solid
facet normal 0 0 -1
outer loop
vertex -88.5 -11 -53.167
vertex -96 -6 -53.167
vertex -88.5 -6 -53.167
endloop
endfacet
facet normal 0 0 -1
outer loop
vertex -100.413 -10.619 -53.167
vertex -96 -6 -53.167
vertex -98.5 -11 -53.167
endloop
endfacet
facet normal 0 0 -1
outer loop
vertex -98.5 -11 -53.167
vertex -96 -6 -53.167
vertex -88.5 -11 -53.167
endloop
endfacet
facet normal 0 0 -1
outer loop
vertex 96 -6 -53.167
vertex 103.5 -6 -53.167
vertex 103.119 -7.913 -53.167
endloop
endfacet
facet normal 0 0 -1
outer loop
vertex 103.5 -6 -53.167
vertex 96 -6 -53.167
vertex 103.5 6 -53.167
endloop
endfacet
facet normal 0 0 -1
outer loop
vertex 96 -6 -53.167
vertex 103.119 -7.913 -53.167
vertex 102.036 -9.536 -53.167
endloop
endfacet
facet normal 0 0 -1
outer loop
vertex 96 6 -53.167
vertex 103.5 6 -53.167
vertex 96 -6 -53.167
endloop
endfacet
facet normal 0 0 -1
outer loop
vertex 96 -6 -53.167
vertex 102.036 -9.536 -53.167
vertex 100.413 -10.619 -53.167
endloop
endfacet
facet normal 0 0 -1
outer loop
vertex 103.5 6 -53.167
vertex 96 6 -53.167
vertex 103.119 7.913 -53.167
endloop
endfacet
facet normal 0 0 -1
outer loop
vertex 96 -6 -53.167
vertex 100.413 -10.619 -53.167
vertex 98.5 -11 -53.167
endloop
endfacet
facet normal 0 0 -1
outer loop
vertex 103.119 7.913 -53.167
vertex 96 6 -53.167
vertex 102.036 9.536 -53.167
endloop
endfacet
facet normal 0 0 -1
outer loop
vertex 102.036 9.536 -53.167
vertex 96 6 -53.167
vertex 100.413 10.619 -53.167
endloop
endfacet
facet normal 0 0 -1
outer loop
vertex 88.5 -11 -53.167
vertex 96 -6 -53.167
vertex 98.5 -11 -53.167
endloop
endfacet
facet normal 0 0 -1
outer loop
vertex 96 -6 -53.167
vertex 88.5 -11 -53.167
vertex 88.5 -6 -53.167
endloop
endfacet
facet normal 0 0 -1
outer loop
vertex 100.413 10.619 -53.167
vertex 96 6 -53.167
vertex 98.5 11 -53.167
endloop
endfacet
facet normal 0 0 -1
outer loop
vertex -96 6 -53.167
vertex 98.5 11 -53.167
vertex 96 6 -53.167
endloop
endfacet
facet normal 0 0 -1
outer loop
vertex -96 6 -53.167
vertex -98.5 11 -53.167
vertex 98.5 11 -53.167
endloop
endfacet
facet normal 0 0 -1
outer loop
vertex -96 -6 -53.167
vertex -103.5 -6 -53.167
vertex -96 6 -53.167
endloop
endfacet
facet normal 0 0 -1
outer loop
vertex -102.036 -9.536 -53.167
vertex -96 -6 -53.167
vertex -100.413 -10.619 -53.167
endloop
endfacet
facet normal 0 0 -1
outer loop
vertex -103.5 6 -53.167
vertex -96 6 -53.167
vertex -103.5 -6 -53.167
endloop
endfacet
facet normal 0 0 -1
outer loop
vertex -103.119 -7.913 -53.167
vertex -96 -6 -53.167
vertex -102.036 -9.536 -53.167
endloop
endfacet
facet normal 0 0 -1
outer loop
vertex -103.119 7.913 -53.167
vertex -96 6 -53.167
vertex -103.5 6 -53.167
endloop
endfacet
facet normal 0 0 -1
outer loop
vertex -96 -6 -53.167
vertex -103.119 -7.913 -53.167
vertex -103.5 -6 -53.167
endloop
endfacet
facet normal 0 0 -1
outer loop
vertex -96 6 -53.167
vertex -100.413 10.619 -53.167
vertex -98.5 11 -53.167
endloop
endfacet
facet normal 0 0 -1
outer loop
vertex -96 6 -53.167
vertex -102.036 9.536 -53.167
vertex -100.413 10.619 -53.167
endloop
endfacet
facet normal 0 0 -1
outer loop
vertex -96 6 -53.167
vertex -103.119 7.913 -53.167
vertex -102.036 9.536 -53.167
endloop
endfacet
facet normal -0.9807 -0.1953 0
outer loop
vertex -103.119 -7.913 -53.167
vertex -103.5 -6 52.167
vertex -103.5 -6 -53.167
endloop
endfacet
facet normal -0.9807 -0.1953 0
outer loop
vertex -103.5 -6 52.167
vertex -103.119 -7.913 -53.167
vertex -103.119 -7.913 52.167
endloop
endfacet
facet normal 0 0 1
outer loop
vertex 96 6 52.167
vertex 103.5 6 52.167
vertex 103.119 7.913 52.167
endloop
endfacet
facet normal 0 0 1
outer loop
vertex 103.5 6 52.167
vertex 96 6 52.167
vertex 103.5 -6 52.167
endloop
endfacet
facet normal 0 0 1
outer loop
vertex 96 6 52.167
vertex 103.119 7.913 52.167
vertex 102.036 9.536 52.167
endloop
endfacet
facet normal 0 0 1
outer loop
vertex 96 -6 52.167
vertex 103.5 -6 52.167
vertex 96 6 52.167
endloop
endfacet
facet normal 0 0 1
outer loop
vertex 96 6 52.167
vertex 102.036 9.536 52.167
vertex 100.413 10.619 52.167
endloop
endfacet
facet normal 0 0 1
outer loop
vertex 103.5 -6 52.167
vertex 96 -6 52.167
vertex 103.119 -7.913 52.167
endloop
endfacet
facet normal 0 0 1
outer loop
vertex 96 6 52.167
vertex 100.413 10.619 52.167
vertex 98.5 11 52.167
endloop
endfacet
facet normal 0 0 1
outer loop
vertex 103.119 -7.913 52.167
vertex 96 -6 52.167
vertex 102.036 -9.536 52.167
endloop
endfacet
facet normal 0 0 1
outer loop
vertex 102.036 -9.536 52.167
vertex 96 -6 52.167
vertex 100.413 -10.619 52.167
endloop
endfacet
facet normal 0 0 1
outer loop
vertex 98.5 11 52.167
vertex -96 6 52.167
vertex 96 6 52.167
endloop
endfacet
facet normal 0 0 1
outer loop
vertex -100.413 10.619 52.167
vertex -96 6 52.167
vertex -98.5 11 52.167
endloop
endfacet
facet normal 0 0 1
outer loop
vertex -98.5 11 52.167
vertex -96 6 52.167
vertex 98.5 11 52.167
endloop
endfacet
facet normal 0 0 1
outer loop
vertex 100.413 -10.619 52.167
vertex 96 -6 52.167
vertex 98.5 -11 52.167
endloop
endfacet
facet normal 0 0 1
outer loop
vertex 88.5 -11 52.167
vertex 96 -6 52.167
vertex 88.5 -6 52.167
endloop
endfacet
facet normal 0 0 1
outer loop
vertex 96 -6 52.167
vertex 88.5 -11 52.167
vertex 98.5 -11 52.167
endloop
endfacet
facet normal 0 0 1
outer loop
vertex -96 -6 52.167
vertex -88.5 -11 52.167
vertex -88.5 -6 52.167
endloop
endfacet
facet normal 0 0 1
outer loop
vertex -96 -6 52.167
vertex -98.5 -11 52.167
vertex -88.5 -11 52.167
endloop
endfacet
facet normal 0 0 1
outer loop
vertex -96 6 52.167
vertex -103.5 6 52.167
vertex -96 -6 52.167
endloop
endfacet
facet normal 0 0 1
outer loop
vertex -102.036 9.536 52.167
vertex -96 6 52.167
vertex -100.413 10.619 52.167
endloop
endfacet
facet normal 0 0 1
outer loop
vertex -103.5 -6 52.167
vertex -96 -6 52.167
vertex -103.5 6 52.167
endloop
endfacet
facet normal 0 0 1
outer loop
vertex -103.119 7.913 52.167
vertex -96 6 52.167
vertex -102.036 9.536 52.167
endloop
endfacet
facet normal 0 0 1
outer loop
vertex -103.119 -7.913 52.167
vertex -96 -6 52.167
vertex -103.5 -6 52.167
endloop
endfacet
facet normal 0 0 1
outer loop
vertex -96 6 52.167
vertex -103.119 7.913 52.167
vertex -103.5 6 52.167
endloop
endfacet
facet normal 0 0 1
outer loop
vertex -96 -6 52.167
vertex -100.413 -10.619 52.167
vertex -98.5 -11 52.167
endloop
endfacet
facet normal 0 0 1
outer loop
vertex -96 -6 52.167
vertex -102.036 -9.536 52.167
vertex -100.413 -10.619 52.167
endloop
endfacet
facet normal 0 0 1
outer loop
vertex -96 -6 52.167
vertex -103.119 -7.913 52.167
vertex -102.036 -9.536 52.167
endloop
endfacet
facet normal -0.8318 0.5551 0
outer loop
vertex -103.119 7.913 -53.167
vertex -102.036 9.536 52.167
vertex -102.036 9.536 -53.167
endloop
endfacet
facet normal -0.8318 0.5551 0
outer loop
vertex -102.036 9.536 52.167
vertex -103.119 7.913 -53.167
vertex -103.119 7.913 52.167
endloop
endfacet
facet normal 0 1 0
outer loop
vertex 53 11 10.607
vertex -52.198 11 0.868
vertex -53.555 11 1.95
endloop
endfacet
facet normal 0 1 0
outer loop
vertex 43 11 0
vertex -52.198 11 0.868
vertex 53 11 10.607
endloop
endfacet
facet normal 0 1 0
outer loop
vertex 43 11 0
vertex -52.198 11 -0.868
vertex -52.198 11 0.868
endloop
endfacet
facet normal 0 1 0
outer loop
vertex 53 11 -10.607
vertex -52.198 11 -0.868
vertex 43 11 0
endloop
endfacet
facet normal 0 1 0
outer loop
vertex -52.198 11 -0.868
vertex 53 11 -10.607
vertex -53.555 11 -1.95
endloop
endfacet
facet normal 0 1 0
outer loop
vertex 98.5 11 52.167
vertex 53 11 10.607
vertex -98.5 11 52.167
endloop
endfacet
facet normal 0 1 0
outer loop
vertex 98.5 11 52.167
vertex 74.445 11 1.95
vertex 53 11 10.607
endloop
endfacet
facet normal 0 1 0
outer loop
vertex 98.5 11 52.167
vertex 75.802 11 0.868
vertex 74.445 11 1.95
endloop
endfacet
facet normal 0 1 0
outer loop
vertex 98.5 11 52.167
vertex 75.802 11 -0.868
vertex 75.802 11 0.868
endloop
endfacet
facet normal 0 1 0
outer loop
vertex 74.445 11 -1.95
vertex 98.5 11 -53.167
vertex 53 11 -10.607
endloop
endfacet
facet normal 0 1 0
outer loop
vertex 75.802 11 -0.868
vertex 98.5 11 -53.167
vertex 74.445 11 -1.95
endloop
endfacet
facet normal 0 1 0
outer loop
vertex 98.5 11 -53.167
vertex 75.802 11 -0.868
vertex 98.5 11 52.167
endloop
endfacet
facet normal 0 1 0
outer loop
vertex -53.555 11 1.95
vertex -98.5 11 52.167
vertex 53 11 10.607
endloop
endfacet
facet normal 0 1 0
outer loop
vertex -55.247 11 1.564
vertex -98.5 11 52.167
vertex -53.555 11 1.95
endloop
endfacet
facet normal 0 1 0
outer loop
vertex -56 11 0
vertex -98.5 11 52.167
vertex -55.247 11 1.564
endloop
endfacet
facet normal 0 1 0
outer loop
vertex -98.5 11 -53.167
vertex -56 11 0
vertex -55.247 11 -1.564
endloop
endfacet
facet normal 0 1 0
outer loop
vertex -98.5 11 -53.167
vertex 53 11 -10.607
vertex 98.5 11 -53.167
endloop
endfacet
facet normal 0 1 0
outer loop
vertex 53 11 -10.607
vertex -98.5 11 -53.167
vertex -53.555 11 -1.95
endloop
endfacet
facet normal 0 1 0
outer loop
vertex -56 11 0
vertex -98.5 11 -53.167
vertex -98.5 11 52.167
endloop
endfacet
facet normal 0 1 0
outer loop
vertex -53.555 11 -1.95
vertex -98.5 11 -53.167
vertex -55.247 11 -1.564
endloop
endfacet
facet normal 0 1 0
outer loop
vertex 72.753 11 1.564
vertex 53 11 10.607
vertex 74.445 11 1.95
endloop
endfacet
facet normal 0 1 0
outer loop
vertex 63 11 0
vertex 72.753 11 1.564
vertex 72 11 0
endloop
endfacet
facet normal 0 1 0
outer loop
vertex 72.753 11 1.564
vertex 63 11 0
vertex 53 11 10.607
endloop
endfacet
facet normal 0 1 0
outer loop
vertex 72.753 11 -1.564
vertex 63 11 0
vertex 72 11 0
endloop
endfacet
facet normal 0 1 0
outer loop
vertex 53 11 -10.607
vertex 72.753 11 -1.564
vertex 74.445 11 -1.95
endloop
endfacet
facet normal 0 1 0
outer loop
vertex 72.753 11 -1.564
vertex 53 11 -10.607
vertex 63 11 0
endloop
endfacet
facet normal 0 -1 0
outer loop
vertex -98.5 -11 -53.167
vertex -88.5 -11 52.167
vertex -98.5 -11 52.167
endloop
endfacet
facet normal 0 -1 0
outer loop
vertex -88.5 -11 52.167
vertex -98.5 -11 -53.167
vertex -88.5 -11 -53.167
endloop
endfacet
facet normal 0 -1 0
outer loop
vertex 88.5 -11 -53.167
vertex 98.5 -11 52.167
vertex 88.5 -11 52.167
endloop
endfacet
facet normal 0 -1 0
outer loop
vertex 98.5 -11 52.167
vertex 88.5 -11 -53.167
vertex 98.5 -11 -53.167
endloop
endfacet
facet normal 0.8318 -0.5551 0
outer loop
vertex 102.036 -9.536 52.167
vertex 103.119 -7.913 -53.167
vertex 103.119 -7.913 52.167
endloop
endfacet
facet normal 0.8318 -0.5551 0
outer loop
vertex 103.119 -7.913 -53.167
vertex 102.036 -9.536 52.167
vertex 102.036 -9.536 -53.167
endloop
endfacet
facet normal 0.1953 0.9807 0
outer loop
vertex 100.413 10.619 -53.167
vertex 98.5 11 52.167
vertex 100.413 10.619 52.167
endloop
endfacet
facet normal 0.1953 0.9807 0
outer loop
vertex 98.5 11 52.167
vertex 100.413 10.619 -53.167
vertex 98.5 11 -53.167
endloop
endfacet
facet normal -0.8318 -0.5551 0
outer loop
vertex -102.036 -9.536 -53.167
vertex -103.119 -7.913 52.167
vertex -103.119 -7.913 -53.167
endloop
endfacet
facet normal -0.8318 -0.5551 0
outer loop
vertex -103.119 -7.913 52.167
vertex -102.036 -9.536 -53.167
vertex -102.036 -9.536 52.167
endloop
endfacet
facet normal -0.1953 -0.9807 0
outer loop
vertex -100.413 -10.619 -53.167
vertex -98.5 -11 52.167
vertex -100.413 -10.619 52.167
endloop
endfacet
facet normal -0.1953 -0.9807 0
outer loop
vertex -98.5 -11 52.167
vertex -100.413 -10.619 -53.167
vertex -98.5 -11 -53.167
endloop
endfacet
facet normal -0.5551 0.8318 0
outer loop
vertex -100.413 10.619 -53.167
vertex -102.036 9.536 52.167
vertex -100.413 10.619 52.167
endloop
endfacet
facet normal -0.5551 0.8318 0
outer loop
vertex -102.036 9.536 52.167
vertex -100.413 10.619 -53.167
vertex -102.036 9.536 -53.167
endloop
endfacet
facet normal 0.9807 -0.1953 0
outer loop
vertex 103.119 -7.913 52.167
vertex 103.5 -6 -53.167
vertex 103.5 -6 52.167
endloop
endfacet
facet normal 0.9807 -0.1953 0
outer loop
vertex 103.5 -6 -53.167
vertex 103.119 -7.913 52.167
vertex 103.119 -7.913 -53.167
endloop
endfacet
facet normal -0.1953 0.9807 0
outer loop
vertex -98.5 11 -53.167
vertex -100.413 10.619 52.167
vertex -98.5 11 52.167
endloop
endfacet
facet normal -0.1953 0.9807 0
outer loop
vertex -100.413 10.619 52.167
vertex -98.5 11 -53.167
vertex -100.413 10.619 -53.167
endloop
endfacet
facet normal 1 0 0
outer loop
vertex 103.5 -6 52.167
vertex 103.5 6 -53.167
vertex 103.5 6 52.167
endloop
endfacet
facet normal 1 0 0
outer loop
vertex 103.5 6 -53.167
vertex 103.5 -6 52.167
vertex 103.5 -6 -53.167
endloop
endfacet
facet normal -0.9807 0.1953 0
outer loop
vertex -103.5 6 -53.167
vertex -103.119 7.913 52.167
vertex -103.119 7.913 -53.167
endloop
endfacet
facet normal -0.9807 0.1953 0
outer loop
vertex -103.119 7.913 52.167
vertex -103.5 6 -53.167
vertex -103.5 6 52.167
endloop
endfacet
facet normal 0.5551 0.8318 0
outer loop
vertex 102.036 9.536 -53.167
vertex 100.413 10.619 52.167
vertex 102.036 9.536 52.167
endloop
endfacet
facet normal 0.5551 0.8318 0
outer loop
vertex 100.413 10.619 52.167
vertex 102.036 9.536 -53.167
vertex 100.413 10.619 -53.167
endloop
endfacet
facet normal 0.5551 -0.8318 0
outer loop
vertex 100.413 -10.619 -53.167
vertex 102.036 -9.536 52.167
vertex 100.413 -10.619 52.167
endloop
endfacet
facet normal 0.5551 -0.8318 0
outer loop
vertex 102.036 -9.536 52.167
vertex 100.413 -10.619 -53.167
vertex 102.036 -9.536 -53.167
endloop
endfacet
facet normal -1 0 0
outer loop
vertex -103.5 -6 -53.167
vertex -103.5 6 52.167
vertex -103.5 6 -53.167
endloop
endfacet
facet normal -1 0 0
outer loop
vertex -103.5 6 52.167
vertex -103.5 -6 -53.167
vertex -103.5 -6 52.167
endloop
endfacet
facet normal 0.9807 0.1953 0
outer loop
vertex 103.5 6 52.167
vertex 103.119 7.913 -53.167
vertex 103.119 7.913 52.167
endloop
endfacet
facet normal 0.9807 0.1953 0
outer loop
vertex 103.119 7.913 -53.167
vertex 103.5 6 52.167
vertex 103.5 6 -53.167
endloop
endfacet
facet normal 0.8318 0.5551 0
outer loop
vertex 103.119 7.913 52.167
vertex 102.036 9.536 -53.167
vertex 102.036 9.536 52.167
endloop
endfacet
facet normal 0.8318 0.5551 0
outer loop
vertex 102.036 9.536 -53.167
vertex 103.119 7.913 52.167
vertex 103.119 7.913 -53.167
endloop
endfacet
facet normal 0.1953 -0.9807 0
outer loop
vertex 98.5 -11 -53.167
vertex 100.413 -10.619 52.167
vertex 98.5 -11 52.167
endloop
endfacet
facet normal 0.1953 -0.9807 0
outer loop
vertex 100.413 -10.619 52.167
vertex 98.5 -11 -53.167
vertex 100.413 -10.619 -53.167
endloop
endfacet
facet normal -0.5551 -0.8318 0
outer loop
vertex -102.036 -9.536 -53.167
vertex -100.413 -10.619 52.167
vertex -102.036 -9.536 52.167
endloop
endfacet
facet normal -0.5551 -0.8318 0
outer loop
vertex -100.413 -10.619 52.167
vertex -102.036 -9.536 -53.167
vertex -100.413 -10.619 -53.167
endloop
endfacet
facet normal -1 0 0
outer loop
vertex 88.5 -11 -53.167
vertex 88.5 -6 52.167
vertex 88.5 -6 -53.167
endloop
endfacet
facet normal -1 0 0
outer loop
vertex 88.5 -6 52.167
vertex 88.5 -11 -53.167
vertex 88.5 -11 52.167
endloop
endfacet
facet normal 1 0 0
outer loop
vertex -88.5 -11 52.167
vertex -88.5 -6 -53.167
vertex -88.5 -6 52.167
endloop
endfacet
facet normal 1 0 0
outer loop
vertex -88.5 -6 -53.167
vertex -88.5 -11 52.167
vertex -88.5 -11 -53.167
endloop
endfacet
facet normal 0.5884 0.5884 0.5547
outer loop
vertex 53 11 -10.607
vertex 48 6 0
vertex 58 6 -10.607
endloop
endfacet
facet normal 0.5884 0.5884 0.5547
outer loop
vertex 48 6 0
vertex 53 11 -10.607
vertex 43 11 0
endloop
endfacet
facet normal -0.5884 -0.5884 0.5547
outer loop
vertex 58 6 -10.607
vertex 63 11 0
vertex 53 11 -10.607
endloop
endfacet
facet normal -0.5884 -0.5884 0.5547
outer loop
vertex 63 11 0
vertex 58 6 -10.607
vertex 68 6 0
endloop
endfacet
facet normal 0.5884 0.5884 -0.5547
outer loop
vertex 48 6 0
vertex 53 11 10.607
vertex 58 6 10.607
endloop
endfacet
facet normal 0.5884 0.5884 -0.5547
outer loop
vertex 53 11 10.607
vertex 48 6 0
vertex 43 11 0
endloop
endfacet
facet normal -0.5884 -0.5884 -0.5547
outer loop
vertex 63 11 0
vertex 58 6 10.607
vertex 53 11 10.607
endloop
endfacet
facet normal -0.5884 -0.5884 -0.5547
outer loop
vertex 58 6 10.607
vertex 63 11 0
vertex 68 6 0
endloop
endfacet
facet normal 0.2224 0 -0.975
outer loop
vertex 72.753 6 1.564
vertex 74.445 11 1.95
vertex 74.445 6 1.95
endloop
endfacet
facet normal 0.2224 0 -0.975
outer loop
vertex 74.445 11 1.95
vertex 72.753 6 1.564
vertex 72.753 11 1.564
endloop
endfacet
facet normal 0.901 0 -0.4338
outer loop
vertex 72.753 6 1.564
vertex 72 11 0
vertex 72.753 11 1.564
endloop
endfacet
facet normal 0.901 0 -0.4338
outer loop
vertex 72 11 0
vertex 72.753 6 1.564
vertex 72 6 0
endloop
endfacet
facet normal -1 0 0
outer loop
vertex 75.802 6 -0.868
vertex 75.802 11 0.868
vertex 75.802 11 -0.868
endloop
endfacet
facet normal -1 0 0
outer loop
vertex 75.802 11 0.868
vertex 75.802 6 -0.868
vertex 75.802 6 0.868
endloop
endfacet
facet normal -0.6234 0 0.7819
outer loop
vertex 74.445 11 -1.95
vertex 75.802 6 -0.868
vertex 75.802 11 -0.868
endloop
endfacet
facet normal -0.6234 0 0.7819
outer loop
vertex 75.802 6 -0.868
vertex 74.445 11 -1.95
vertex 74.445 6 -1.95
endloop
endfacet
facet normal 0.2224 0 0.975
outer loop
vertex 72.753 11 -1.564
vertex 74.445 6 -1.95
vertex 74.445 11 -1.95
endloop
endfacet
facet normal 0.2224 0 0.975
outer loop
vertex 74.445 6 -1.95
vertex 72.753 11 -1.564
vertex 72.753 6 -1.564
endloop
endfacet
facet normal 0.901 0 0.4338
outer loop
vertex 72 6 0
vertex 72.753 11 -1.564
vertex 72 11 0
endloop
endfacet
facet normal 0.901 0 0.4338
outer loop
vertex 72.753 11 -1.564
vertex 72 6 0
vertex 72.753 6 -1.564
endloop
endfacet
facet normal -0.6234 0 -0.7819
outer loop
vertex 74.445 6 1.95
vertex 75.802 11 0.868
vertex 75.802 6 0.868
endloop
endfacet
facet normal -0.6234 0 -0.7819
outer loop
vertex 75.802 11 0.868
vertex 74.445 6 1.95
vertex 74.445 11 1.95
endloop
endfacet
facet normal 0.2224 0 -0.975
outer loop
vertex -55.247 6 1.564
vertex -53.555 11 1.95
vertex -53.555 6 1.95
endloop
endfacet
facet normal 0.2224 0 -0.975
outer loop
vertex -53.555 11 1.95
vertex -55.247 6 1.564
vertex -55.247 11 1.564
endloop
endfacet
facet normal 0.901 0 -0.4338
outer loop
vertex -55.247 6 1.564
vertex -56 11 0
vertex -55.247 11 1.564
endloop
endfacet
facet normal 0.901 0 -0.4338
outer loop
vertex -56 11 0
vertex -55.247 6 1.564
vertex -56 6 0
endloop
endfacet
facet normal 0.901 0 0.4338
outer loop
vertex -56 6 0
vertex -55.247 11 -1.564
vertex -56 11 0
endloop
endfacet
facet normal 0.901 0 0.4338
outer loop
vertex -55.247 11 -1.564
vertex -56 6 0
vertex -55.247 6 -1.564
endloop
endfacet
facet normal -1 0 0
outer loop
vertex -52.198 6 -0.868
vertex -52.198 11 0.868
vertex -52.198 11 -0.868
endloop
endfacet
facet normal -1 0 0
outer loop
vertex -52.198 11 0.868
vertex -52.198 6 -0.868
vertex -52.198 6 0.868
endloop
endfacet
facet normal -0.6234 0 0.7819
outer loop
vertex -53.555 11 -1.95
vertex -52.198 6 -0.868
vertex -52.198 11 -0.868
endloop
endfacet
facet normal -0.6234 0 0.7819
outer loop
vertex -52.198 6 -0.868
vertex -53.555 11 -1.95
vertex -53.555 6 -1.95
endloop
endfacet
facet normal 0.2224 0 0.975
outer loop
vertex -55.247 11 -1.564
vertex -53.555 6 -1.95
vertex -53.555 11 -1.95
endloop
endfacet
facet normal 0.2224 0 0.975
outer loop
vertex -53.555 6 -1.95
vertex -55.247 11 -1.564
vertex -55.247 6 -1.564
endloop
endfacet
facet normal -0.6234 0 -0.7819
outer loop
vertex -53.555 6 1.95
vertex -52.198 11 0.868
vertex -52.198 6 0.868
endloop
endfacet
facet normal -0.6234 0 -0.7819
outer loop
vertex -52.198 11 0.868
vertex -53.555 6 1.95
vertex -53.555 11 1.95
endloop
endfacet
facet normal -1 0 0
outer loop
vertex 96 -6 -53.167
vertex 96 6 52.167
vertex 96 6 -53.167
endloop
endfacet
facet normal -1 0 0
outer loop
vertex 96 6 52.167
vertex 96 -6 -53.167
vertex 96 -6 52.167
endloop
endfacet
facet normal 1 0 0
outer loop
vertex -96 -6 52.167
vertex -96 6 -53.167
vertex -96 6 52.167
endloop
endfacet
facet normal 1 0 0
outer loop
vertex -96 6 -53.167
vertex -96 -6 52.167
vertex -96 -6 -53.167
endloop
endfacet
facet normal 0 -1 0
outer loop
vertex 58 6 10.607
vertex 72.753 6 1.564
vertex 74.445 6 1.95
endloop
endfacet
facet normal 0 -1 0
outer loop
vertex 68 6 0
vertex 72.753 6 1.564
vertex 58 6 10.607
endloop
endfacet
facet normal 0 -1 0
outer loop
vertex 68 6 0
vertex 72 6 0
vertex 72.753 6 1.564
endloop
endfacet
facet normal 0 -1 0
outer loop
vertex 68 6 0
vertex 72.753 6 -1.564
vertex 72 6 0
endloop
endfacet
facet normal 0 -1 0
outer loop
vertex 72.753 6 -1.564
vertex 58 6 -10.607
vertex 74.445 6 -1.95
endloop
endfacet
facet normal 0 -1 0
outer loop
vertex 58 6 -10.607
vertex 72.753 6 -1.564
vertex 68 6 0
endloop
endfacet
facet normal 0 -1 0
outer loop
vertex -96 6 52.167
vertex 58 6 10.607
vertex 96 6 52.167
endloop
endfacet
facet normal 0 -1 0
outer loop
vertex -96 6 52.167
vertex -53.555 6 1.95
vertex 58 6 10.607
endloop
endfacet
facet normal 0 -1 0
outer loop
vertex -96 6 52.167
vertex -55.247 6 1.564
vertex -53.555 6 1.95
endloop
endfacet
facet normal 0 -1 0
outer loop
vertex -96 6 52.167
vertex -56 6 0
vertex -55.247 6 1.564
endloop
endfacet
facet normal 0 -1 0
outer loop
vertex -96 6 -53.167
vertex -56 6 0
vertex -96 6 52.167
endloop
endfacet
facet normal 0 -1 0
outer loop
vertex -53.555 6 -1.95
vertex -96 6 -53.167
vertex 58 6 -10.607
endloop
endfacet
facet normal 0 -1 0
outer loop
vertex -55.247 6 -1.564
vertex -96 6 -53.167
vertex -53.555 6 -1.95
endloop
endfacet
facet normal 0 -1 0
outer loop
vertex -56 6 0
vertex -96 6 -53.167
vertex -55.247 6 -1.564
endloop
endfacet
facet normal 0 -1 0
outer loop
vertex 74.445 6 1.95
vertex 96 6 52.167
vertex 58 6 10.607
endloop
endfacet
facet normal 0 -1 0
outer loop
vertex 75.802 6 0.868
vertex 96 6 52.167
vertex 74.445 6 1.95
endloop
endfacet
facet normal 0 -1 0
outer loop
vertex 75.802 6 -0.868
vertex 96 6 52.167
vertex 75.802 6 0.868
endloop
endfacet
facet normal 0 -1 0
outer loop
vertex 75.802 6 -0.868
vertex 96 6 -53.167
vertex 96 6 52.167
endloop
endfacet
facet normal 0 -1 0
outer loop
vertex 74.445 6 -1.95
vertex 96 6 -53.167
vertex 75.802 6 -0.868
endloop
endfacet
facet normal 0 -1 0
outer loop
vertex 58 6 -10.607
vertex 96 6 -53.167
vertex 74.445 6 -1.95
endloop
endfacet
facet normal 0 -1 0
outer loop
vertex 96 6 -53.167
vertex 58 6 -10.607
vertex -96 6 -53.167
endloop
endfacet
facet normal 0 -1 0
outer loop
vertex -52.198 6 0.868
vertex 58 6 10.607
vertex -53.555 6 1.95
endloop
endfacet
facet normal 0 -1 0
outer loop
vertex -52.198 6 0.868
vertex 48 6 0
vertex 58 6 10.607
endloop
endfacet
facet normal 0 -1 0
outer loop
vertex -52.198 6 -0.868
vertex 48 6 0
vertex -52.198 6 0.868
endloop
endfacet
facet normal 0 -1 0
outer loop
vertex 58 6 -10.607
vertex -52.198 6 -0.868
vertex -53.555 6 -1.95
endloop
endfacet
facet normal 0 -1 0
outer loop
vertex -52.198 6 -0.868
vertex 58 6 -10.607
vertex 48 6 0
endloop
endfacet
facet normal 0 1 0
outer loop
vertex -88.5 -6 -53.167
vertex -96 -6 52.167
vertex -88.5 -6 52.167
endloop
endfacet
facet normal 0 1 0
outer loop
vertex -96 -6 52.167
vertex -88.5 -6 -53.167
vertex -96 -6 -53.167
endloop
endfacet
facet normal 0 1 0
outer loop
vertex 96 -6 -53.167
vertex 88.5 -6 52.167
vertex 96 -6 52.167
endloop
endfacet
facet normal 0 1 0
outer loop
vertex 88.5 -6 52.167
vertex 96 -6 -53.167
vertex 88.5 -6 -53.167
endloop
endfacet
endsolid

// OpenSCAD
// Tablet dimensions
// Acer Switch 11
tablet_x     = 313;	// Width in stand
tablet_y     =  12;   // Thickness of tablet
tablet_z     = 192;   // Height in stand

max_printbed = 150;	// Max comfortable printbed size, allow for perimeters

if (0) {
	tablet();
}

rotate( [0,90,0] )		// Lay it down so it can print in the strong direction
	difference() {
		holder();
		tablet();
	}

module holder() {
	difference() {

		// Combines a cube and a cylinder to round off the corners.
		minkowski() {
			// Base size of the cube of the holder
			cube( [tablet_x/3,tablet_y,tablet_z+5], center=true );
			// The cube above will grow by 2x the radius of the corner
			rotate([0,90,0])
				cylinder(r=5,h=1);
		}

		// Cut out face
		translate([0,-5,0])
			cube( [tablet_x/3+10,tablet_y+1,tablet_z-15], center=true );

		// Nail cutout
		translate([0,0,tablet_z/3])
			rotate( [-45,0,0] )
			scale([1.5,1,1])
				rotate( [0,45,0] )
					cube( [10,50,10], center=true );

		// Screw holes
		translate([0,0,tablet_z/3+10])
		rotate([0,90,90])
			cylinder( r=2, h=50, center=true );
		translate([0,0,-tablet_z/3+10])
		rotate([0,90,90])
			cylinder( r=2, h=50, center=true );
	}
}


// used to subtract from the circle
module tablet() {
	color( "red" )
	cube( [ tablet_x, tablet_y, tablet_z ], center=true );
}
